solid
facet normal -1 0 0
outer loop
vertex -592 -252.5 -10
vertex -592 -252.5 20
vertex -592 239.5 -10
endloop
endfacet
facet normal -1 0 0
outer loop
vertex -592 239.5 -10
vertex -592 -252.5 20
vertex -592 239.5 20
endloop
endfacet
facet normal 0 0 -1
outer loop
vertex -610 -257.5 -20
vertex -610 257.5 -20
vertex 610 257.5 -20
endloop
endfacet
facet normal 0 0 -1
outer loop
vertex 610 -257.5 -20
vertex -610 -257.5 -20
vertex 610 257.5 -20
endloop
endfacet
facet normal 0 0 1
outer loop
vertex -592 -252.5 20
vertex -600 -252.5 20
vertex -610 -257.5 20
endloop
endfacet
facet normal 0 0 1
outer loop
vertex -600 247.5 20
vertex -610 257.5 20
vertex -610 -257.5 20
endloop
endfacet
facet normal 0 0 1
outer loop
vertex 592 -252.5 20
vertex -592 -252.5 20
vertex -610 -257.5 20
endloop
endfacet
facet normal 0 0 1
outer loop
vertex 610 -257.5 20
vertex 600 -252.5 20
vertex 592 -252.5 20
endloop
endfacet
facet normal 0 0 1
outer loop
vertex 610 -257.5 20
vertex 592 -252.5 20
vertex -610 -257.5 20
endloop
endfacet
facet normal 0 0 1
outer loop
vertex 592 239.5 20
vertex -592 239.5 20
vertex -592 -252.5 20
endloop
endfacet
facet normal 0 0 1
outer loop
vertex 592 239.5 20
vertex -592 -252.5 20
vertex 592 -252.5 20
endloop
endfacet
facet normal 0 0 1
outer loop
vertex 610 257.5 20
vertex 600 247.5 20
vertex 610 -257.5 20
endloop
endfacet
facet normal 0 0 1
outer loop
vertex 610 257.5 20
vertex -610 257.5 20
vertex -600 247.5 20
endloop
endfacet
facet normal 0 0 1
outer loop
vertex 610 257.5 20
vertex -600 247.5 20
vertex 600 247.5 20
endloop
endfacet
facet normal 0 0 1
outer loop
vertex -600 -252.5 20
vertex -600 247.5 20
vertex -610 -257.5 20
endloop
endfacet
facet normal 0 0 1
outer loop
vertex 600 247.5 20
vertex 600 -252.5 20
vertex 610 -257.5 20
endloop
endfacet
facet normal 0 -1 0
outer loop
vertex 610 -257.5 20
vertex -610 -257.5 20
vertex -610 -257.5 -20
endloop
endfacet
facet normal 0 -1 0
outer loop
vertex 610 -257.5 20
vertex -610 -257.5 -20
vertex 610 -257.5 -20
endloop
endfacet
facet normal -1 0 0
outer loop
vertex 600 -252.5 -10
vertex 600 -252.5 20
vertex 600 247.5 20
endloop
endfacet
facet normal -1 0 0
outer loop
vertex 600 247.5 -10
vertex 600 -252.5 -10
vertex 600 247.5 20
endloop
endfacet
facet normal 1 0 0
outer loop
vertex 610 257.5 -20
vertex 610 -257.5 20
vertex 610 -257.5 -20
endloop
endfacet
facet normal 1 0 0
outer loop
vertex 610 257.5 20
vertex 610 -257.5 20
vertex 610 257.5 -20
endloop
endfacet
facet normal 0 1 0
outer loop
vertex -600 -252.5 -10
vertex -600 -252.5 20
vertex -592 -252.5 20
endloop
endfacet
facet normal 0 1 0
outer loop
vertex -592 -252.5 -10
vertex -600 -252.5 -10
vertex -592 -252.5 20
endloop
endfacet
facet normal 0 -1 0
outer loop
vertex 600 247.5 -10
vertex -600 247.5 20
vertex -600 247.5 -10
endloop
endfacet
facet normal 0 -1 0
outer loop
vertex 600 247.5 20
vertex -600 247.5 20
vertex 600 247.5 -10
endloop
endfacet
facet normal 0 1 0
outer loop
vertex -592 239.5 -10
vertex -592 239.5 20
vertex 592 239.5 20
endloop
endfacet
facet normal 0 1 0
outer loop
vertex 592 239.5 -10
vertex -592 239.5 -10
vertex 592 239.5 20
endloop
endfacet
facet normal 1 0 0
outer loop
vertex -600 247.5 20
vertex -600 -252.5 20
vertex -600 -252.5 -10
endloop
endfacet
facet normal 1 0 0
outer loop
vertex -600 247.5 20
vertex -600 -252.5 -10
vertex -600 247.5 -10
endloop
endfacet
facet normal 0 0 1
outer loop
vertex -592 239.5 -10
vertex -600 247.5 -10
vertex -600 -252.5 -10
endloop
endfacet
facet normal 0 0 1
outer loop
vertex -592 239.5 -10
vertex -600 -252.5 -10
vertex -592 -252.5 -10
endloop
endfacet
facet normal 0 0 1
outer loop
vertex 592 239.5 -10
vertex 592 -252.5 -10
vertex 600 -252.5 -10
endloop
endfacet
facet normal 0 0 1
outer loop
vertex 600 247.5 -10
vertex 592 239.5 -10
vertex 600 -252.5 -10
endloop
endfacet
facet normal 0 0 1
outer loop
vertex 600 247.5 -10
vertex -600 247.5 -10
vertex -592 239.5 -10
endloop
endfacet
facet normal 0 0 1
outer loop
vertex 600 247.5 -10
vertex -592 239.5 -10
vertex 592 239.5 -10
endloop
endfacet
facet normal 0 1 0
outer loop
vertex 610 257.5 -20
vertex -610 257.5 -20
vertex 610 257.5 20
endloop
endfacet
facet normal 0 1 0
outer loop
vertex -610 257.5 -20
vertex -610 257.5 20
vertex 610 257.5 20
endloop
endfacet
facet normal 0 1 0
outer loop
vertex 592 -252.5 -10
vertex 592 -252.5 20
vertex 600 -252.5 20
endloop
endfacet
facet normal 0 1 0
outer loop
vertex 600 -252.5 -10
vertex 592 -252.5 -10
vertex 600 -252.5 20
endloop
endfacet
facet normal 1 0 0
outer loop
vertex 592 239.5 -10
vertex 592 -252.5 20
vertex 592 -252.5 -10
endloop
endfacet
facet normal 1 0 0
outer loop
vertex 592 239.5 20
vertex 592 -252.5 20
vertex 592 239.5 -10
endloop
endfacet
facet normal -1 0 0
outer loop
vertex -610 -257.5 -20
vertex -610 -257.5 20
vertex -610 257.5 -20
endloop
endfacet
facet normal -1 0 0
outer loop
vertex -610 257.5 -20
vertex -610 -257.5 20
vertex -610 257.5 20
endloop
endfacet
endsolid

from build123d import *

# Parameters (mm, degrees)
F0_W     = 1220
F0_H     = 515
F1_DEPTH = 20
F2_W     = 1200
F2_H     = 8
F3_DEPTH = 30
F4_W     = 8
F4_H     = 492
F5_DEPTH = 30
F6_W     = 8
F6_H     = 492
F7_DEPTH = 30


with BuildPart() as f1:
    # F0 (on Top) → F1 (new body, symmetric)
    with BuildSketch(Plane.XY):
        Rectangle(F0_W, F0_H)
    extrude(amount=F1_DEPTH, both=True)

    # F2 (on face) → F3 (cut)
    with BuildSketch(Plane.XY.offset(20)):
        with Locations((0, 243.5)):
            Rectangle(F2_W, F2_H)
    extrude(amount=-F3_DEPTH, mode=Mode.SUBTRACT)

    # F4 (on face) → F5 (cut)
    with BuildSketch(Plane.XY.offset(20)):
        with Locations((-596, -6.5)):
            Rectangle(F4_W, F4_H)
    extrude(amount=-F5_DEPTH, mode=Mode.SUBTRACT)

    # F6 (on face) → F7 (cut)
    with BuildSketch(Plane.XY.offset(20)):
        with Locations((596, -6.5)):
            Rectangle(F6_W, F6_H)
    extrude(amount=-F7_DEPTH, mode=Mode.SUBTRACT)


solid = f1.part
